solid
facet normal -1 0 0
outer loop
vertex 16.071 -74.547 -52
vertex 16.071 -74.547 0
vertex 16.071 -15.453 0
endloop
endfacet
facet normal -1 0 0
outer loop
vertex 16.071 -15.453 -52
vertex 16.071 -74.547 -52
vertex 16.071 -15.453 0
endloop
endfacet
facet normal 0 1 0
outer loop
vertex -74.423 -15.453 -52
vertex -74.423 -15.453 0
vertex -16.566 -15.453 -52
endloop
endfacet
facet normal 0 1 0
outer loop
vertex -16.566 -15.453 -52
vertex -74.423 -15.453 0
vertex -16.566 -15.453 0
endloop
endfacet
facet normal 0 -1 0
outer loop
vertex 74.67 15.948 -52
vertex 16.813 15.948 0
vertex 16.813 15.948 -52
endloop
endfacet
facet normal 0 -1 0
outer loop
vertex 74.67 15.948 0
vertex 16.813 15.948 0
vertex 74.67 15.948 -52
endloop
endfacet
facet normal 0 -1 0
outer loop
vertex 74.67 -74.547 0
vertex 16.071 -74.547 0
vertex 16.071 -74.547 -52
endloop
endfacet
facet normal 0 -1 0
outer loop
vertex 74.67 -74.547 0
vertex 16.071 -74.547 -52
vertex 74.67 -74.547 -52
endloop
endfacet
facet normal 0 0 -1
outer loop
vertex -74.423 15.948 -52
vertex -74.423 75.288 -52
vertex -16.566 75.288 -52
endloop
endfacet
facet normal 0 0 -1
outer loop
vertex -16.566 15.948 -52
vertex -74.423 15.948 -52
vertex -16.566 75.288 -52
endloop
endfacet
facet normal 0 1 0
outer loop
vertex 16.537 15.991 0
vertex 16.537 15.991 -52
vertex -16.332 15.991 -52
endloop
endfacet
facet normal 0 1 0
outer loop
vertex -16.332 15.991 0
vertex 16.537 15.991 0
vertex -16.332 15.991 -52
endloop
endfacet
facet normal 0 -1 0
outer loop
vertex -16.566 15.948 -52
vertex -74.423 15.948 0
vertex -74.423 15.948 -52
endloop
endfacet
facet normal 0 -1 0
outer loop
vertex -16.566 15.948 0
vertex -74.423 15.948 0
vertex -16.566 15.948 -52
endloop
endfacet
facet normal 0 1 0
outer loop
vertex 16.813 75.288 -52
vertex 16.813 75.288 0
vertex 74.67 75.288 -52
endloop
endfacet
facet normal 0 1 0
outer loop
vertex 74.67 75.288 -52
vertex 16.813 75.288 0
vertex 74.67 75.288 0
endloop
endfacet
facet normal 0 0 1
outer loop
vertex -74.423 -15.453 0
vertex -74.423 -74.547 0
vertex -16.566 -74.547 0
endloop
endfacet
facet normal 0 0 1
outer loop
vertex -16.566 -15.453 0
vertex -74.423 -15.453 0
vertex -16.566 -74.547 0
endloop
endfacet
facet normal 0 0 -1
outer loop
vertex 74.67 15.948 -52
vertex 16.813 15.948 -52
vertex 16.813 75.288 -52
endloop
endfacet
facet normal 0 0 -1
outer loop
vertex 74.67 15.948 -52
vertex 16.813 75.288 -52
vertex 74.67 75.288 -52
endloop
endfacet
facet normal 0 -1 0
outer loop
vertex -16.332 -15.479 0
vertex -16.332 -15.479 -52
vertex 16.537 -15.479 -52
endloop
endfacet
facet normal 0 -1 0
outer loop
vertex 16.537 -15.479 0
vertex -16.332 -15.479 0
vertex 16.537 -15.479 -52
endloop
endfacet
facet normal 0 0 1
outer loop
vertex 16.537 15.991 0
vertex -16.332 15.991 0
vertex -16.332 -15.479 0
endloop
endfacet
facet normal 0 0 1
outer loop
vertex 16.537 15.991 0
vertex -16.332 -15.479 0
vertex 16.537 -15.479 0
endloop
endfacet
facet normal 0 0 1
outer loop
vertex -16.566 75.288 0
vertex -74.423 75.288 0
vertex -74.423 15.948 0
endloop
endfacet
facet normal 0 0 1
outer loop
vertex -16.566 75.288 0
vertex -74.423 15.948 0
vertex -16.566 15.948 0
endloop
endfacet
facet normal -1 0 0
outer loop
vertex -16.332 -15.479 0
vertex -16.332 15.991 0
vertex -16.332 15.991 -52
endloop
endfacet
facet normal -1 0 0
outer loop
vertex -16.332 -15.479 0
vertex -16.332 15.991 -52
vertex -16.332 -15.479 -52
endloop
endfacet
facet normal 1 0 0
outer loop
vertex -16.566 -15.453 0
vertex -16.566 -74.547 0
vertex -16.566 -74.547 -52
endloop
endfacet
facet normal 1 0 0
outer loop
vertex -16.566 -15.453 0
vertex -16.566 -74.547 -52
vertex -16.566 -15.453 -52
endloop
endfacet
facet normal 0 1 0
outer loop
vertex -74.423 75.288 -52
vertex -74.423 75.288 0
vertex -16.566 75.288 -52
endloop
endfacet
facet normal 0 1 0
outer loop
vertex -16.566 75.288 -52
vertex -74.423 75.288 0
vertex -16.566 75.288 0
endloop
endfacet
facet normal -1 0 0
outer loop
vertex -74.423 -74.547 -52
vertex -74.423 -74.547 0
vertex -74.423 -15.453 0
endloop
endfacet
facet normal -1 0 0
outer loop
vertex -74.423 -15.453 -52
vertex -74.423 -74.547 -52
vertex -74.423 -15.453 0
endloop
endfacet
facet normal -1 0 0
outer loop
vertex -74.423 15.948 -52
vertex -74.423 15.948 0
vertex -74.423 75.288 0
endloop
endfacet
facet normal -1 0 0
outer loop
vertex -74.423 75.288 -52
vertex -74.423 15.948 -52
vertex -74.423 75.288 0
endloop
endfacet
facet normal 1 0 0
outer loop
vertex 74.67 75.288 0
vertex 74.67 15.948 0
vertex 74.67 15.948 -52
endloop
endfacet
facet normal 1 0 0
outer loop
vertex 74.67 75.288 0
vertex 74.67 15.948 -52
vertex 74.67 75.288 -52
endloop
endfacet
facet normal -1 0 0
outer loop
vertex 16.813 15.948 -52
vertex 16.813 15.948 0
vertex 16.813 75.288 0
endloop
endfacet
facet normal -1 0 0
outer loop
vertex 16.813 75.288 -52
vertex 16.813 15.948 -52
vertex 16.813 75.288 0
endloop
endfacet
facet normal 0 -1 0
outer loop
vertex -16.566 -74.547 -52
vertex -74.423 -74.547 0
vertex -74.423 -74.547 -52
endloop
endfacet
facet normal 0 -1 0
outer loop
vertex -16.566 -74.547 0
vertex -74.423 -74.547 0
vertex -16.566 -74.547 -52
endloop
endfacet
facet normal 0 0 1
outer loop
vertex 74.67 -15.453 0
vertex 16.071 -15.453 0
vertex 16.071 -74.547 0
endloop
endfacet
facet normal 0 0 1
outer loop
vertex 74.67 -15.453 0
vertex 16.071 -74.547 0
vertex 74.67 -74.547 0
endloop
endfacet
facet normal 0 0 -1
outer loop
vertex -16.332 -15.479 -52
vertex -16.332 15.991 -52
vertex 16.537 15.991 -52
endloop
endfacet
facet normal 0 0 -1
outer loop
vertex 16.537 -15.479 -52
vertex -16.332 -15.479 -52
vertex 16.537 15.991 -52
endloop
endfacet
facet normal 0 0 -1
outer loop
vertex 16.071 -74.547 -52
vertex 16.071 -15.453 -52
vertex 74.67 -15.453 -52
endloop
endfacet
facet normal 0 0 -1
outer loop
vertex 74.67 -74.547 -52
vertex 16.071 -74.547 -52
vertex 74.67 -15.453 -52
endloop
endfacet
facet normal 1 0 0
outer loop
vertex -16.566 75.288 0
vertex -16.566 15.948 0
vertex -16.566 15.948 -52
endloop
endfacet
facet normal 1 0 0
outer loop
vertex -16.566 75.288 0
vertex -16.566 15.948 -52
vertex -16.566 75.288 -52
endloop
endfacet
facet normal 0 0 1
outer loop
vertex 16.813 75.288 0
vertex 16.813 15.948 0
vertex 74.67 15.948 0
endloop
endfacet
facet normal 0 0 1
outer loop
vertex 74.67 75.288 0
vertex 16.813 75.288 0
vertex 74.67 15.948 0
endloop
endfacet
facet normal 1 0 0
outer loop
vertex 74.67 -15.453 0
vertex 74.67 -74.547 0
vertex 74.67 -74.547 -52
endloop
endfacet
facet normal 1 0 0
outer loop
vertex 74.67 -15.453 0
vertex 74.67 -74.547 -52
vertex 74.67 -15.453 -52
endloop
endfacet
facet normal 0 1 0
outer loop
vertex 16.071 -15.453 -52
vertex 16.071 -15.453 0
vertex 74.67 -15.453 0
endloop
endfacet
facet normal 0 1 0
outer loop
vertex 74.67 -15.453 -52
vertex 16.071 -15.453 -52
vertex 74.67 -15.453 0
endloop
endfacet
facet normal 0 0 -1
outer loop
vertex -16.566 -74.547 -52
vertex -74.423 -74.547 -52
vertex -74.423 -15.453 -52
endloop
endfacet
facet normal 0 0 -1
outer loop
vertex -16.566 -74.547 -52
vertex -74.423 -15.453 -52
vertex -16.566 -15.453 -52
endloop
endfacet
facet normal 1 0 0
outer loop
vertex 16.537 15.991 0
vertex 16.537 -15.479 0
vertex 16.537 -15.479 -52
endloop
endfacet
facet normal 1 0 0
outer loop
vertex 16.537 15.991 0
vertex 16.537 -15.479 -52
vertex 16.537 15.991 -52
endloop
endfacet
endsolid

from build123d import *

# Parameters (mm, degrees)
F1_W     = 57.8571464866
F1_H     = 59.0934129432
F2_DEPTH = 52
F1_W_2   = 58.5989002138
F1_W_3   = 57.8571408987
F1_H_2   = 59.3406651169
F0_W     = 16.5366157889
F0_H     = 15.9914717078
F0_W_2   = 16.3322016597
F0_H_2   = 15.4786622152


with BuildPart() as f2:
    # F1 (on Top) → F2 (new body)
    with BuildSketch(Plane.XY):
        with Locations((-45.4945089296, -45.0000031851)):
            Rectangle(F1_W, F1_H)
    extrude(amount=-F2_DEPTH)


with BuildPart() as f2b:
    # F1 (on Top) → F2, piece 2 (new body)
    with BuildSketch(Plane.XY):
        with Locations((45.3708795831, -45.0000031851)):
            Rectangle(F1_W_2, F1_H)
    extrude(amount=-F2_DEPTH)


with BuildPart() as f2c:
    # F1 (on Top) → F2, piece 3 (new body)
    with BuildSketch(Plane.XY):
        with Locations((45.7417592406, 45.6181345508)):
            Rectangle(F1_W_3, F1_H_2)
    extrude(amount=-F2_DEPTH)


with BuildPart() as f2d:
    # F1 (on Top) → F2, piece 4 (new body)
    with BuildSketch(Plane.XY):
        with Locations((-45.4945089296, 45.6181345508)):
            Rectangle(F1_W, F1_H_2)
    extrude(amount=-F2_DEPTH)


with BuildPart() as f2e:
    # F0 (on Top) → F2, piece 5 (new body)
    with BuildSketch(Plane.XY):
        with Locations((8.2683078945, 7.9957358539)):
            Rectangle(F0_W, F0_H)
        with Locations((-8.1661008298, -7.7393311076)):
            Rectangle(F0_W_2, F0_H_2)
        with Locations((-8.1661008298, 7.9957358539)):
            Rectangle(F0_W_2, F0_H)
        with Locations((8.2683078945, -7.7393311076)):
            Rectangle(F0_W, F0_H_2)
    extrude(amount=-F2_DEPTH)


solid = Compound([f2.part, f2b.part, f2c.part, f2d.part, f2e.part])
